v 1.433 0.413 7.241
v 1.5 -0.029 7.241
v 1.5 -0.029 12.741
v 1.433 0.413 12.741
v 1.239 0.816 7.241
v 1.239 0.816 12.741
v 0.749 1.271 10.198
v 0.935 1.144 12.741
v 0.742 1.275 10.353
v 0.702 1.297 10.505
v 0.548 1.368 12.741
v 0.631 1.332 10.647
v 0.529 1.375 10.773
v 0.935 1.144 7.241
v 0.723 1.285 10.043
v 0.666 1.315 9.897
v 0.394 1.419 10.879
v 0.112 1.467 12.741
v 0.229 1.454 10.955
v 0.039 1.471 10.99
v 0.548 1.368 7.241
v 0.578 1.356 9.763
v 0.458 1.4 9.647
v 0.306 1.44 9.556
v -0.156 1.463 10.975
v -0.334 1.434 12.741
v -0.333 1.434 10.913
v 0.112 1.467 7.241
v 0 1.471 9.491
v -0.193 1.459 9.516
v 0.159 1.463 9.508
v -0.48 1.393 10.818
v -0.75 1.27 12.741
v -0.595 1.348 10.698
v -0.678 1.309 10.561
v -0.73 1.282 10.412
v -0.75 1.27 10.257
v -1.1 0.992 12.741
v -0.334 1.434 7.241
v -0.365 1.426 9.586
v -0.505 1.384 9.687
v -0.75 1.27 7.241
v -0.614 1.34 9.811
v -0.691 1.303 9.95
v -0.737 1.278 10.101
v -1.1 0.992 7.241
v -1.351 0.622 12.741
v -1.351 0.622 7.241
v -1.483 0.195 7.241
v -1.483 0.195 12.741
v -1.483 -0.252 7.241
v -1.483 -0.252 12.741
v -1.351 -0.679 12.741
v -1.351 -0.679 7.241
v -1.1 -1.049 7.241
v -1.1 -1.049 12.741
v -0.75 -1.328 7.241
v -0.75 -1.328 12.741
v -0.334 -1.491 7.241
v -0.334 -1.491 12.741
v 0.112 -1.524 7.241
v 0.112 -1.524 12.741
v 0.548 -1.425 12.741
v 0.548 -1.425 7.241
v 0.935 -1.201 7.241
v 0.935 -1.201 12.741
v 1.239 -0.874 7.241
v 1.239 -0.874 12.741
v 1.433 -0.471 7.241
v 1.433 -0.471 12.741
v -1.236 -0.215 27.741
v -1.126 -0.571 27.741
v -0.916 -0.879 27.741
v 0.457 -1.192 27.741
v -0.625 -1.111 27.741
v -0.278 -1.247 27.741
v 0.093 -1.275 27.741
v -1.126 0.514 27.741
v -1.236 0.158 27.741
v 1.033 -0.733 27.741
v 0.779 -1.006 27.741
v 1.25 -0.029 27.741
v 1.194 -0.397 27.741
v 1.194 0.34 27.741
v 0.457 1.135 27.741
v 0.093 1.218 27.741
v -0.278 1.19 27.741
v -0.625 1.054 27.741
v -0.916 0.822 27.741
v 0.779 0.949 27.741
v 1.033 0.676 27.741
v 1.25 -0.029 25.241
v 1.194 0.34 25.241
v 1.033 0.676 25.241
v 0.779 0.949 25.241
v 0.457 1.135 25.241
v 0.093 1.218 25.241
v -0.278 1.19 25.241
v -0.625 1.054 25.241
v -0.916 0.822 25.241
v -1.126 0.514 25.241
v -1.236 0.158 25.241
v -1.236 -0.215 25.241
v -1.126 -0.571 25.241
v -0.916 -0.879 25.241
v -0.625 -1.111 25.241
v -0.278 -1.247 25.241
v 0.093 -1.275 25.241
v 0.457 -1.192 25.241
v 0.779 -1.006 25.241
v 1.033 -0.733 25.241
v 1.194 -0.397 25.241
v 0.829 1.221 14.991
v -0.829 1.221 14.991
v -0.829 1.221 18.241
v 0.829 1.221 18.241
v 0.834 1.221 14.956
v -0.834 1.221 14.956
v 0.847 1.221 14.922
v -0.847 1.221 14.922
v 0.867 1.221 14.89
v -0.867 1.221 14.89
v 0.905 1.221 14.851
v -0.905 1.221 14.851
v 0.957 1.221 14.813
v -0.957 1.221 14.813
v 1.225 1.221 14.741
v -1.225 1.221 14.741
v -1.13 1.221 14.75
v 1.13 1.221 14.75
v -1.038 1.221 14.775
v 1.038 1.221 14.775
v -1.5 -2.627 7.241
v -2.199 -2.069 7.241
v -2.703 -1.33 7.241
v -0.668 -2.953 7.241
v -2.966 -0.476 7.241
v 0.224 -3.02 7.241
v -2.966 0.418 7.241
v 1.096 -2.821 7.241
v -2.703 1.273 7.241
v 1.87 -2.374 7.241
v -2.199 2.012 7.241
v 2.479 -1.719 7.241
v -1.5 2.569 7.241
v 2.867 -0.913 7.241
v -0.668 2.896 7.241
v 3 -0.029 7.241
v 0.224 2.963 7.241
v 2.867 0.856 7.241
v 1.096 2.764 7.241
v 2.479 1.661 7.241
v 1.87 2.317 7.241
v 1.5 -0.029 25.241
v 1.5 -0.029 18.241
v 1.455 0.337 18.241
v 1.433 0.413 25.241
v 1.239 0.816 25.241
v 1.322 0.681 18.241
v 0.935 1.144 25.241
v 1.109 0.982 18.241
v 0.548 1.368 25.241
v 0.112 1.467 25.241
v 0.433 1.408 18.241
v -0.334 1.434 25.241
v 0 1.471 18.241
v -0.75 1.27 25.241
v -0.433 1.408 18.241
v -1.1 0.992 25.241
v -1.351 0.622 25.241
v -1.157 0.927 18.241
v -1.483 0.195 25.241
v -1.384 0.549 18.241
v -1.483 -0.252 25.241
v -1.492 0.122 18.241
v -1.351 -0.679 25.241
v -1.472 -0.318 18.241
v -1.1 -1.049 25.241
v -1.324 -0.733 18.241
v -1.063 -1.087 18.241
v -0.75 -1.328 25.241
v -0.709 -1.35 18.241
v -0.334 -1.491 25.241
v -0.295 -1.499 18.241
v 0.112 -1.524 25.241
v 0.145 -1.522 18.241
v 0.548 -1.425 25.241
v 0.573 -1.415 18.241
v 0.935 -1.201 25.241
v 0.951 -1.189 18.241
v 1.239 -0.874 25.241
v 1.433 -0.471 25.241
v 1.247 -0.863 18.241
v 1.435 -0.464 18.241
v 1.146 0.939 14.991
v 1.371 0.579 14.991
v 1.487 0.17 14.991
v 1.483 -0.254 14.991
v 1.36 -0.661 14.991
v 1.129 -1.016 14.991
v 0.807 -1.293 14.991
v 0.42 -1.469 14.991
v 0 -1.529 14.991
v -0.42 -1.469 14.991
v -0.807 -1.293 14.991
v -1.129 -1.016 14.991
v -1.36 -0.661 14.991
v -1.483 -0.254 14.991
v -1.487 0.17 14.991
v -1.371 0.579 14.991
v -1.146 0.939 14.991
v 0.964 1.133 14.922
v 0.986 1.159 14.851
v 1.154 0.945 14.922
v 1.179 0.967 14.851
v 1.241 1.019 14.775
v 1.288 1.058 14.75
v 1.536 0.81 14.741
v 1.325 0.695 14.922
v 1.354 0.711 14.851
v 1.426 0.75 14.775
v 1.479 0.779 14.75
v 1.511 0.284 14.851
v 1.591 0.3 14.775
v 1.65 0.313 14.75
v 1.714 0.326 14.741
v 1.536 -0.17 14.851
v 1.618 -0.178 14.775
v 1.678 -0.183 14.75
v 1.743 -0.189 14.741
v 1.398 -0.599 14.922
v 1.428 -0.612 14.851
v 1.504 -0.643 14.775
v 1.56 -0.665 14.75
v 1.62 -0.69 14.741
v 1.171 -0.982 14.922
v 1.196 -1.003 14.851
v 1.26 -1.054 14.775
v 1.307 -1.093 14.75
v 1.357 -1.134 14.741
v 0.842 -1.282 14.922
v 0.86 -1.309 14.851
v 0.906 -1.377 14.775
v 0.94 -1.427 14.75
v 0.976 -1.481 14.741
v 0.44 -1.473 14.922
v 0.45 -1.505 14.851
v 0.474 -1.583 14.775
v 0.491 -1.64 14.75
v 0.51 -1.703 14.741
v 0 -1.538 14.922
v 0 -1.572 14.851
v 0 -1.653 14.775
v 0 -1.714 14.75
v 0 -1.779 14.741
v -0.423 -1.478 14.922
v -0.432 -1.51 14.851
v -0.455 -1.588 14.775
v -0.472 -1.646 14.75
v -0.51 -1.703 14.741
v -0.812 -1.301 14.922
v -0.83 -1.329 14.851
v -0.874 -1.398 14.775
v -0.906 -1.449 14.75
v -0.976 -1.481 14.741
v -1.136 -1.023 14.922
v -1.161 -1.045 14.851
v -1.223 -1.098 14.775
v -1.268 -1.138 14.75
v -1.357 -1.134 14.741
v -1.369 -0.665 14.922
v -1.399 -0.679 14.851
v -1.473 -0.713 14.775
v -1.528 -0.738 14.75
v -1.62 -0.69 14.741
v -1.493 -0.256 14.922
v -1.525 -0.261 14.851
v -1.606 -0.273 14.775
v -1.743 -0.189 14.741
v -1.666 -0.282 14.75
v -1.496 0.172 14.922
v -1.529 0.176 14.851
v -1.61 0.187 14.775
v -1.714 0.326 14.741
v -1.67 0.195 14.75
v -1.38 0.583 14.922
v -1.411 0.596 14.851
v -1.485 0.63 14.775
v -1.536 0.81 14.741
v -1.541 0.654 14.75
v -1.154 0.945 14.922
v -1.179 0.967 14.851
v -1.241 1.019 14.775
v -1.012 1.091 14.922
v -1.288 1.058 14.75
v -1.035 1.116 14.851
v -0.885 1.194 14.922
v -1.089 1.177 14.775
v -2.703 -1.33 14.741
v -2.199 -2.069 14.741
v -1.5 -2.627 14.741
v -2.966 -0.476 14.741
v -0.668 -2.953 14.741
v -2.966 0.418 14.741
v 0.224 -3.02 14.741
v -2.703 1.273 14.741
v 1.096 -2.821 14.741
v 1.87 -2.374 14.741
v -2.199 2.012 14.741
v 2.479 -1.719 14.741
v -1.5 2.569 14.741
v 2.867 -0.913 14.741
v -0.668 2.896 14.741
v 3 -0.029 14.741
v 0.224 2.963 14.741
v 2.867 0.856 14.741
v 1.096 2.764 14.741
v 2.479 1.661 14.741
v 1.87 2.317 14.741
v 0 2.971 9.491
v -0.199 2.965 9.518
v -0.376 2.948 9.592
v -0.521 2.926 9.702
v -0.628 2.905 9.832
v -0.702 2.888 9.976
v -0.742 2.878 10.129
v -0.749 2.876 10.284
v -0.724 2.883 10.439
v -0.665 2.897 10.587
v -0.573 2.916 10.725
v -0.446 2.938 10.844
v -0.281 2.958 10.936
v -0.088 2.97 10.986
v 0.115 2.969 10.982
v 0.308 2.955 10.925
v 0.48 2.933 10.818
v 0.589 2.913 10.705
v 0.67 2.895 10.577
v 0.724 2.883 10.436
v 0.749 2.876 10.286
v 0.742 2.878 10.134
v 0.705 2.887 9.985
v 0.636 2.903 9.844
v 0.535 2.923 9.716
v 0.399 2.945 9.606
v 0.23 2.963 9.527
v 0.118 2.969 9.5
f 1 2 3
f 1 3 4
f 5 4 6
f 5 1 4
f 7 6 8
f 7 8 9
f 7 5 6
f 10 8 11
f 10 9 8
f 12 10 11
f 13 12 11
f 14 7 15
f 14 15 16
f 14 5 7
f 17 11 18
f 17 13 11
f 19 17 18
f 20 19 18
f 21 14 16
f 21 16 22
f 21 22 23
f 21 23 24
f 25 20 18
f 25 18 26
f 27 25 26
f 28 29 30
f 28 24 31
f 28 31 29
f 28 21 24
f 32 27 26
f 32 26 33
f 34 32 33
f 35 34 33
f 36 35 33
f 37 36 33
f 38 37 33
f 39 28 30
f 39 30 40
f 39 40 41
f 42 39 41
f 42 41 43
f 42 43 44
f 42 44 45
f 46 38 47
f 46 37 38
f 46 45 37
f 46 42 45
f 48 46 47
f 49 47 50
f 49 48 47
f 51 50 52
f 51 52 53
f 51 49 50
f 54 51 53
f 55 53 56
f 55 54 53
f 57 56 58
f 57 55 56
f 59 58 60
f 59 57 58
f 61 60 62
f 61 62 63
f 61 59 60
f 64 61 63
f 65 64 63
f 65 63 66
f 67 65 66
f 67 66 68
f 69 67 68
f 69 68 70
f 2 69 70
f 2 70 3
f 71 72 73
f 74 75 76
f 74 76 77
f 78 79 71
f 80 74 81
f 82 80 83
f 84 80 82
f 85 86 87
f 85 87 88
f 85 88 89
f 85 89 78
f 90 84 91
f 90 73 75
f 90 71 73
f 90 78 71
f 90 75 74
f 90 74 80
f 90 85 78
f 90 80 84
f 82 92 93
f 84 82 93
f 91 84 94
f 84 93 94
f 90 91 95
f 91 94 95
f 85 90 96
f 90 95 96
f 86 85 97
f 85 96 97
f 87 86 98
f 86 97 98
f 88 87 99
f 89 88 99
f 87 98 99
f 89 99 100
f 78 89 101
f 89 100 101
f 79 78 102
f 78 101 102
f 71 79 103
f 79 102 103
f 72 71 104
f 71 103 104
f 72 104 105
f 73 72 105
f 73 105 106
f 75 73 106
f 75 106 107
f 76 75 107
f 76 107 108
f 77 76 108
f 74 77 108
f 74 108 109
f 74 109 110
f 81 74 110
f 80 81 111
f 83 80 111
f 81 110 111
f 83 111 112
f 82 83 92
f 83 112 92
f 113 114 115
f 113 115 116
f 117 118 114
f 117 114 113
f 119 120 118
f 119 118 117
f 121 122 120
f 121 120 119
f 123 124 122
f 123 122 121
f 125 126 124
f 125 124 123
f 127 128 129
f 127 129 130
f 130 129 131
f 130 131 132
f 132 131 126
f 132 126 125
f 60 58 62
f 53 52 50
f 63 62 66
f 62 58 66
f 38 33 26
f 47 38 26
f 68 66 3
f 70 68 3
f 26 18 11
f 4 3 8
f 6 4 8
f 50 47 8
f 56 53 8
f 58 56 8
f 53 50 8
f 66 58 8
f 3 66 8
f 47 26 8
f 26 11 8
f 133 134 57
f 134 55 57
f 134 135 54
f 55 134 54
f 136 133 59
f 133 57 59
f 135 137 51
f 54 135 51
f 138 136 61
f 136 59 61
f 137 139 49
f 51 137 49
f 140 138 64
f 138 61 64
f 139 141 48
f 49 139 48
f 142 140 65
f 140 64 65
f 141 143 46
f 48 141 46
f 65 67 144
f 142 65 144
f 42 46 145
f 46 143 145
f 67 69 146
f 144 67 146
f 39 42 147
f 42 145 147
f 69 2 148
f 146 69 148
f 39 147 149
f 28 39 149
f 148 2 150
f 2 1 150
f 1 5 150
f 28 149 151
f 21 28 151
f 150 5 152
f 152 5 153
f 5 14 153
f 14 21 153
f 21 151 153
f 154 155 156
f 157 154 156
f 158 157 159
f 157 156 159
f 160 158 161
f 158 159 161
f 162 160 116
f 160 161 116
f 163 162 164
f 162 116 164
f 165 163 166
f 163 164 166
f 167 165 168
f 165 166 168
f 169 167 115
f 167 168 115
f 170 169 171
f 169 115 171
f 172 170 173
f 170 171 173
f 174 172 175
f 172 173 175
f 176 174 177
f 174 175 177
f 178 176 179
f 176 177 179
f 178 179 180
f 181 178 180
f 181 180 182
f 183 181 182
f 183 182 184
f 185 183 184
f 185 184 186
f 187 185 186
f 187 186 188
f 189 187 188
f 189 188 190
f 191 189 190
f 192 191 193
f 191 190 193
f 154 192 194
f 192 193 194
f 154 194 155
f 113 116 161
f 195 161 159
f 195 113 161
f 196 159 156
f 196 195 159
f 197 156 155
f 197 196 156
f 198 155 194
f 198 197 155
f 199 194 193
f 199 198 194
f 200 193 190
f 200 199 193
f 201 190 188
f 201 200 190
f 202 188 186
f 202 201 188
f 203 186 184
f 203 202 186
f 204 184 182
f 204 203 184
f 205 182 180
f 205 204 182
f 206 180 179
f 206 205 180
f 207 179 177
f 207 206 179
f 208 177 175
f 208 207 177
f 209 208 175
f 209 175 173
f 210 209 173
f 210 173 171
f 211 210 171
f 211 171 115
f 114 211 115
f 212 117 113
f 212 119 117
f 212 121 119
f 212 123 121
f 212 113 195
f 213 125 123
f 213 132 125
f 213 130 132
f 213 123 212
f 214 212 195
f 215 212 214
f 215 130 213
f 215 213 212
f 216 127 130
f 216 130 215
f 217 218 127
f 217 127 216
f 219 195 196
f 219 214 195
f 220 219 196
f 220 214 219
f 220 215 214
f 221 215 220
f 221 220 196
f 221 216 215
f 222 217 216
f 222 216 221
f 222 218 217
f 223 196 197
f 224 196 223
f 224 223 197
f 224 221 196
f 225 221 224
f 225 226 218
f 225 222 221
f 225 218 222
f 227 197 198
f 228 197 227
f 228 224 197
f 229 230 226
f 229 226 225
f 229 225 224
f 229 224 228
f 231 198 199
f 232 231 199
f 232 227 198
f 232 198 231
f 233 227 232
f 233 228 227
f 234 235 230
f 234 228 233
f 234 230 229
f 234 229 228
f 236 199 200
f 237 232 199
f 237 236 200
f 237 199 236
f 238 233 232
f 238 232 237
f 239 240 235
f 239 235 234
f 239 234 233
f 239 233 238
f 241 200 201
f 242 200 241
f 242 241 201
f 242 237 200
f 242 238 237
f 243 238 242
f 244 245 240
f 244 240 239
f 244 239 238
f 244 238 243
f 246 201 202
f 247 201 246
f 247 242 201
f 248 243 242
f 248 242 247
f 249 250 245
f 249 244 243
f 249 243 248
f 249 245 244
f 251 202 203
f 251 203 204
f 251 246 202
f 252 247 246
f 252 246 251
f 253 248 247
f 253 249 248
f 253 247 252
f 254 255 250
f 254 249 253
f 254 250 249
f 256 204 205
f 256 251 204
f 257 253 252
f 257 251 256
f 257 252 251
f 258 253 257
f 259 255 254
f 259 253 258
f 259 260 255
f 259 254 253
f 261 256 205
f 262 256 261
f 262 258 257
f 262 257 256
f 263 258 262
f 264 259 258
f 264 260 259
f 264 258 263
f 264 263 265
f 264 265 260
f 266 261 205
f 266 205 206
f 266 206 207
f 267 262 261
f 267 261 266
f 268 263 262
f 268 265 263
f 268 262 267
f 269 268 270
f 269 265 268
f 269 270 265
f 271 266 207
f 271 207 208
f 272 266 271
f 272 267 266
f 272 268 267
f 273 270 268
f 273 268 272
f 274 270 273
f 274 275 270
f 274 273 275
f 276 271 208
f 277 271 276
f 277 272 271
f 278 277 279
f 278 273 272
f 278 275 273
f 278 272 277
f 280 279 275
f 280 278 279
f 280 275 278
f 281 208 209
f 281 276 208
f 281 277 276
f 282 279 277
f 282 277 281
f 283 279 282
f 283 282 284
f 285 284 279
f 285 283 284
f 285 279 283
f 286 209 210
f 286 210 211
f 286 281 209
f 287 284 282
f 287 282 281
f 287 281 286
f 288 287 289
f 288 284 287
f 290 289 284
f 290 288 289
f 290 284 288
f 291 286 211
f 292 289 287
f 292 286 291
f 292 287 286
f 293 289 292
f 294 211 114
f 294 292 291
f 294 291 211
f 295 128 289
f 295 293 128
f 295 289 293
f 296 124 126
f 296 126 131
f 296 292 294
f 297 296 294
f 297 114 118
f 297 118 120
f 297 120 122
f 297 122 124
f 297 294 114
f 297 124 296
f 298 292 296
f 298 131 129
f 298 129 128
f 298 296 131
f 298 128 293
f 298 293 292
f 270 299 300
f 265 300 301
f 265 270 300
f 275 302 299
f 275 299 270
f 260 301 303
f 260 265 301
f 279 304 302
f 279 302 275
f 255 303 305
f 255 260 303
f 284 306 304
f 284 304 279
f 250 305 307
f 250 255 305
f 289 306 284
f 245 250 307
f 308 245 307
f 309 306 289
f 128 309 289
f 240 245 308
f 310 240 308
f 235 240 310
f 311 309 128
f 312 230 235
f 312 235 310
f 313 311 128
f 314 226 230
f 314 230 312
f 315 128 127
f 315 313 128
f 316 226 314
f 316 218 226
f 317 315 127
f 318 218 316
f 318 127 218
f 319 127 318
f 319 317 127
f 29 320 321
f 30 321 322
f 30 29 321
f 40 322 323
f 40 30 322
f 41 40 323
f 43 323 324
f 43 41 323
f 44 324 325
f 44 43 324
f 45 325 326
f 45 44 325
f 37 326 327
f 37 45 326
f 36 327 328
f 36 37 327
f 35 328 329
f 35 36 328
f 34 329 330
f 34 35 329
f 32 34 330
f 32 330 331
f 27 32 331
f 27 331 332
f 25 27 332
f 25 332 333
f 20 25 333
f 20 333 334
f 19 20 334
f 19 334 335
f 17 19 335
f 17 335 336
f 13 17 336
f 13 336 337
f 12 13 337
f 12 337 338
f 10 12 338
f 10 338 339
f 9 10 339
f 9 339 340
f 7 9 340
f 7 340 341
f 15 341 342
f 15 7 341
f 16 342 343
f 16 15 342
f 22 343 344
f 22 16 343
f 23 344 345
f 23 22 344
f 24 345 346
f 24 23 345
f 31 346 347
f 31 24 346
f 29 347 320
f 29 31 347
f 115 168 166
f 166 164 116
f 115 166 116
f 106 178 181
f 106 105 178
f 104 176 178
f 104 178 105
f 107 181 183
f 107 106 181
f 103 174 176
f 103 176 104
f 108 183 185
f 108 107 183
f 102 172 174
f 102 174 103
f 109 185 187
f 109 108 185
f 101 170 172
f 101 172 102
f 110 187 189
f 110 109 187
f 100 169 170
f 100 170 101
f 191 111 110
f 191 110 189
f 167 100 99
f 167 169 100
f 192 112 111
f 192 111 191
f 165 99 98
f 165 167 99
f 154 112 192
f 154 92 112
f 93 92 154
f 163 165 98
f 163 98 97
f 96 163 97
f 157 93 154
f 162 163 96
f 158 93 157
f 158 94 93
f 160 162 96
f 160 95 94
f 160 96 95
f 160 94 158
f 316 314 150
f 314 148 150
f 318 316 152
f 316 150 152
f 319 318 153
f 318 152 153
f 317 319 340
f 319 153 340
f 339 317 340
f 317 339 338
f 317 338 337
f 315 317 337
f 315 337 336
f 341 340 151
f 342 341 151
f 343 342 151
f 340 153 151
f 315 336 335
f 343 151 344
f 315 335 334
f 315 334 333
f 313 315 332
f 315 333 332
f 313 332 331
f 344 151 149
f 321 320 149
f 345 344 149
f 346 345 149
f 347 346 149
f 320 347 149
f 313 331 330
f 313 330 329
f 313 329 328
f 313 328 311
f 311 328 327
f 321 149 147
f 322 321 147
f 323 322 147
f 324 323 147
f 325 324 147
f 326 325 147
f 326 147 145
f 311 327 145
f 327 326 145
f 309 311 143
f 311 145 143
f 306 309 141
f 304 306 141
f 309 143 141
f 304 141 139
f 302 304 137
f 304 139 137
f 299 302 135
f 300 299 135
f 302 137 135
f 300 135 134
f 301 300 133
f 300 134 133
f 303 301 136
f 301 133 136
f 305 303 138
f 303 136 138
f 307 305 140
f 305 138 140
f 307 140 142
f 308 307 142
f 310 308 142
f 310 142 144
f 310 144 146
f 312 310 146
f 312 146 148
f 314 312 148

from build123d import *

# Parameters (mm, degrees)
SKETCH1_R           = 6
SKETCH1_R_2         = 3
BOSS_EXTRUDE1_DEPTH = 11
SKETCH2_R           = 1.5
CUT_EXTRUDE1_DEPTH  = 14.892443989
SKETCH3_R           = 6
BOSS_EXTRUDE2_DEPTH = 4
BOSS_EXTRUDE3_DEPTH = 7
SKETCH5_R           = 3
BOSS_EXTRUDE6_DEPTH = 14
SKETCH7_R           = 2.5
BOSS_EXTRUDE7_DEPTH = 5
FILLET1_R           = 0.5
ECHELLE1_SCALE      = 2
ECHELLE2_SCALE      = 0.25


with BuildPart() as part:
    # Sketch1 → Boss-Extrude1 (new body)
    with BuildSketch(Plane.XY):
        Circle(SKETCH1_R)
        Circle(SKETCH1_R_2, mode=Mode.SUBTRACT)
    extrude(amount=BOSS_EXTRUDE1_DEPTH)

    # Sketch2 → Cut-Extrude1 (cut, through all)
    with BuildSketch(Plane(origin=(0, 0, 0), x_dir=(1, 0, 0), z_dir=(0, 1, 0))):
        with Locations(Location((0, -6, 0), (0, 0, 90))):
            Circle(SKETCH2_R)
    extrude(amount=CUT_EXTRUDE1_DEPTH, mode=Mode.SUBTRACT)

    # Sketch3 → Boss-Extrude2 (add)
    with BuildSketch(Plane.XY.offset(11)):
        Circle(SKETCH3_R)
    extrude(amount=BOSS_EXTRUDE2_DEPTH)

    # Sketch4 → Boss-Extrude3 (add)
    with BuildSketch(Plane.XY.offset(15)):
        with BuildLine():
            Line((-1.658312395, 2.5), (1.658312395, 2.5))
            ThreePointArc((1.658312395, 2.5), (0, -3), (-1.658312395, 2.5))
        make_face()
    extrude(amount=BOSS_EXTRUDE3_DEPTH)

    # Sketch5 → Boss-Extrude6 (add)
    with BuildSketch(Plane.XY.offset(22)):
        Circle(SKETCH5_R)
    extrude(amount=BOSS_EXTRUDE6_DEPTH)

    # Sketch7 → Boss-Extrude7 (add)
    with BuildSketch(Plane.XY.offset(36)):
        Circle(SKETCH7_R)
    extrude(amount=BOSS_EXTRUDE7_DEPTH)

    # Fillet1
    fillet1_edges = [part.edges().sort_by_distance(p)[0] for p in [
        (0, -3, 15),
    ]]
    fillet(fillet1_edges, radius=FILLET1_R)


with BuildPart() as part_1:
    # Echelle1: scaled about (-5.064e-06, -0.057271287, 14.482309023)
    add(part.part.scale(ECHELLE1_SCALE).moved(Location((5.064e-06, 0.057271287, -14.482309023))))


with BuildPart() as part_2:
    # Echelle2: scaled about (-5.063e-06, -0.057271287, 14.482309023)
    add(part_1.part.scale(ECHELLE2_SCALE).moved(Location((-3.797e-06, -0.042953465, 10.861731767))))


solid = part_2.part
